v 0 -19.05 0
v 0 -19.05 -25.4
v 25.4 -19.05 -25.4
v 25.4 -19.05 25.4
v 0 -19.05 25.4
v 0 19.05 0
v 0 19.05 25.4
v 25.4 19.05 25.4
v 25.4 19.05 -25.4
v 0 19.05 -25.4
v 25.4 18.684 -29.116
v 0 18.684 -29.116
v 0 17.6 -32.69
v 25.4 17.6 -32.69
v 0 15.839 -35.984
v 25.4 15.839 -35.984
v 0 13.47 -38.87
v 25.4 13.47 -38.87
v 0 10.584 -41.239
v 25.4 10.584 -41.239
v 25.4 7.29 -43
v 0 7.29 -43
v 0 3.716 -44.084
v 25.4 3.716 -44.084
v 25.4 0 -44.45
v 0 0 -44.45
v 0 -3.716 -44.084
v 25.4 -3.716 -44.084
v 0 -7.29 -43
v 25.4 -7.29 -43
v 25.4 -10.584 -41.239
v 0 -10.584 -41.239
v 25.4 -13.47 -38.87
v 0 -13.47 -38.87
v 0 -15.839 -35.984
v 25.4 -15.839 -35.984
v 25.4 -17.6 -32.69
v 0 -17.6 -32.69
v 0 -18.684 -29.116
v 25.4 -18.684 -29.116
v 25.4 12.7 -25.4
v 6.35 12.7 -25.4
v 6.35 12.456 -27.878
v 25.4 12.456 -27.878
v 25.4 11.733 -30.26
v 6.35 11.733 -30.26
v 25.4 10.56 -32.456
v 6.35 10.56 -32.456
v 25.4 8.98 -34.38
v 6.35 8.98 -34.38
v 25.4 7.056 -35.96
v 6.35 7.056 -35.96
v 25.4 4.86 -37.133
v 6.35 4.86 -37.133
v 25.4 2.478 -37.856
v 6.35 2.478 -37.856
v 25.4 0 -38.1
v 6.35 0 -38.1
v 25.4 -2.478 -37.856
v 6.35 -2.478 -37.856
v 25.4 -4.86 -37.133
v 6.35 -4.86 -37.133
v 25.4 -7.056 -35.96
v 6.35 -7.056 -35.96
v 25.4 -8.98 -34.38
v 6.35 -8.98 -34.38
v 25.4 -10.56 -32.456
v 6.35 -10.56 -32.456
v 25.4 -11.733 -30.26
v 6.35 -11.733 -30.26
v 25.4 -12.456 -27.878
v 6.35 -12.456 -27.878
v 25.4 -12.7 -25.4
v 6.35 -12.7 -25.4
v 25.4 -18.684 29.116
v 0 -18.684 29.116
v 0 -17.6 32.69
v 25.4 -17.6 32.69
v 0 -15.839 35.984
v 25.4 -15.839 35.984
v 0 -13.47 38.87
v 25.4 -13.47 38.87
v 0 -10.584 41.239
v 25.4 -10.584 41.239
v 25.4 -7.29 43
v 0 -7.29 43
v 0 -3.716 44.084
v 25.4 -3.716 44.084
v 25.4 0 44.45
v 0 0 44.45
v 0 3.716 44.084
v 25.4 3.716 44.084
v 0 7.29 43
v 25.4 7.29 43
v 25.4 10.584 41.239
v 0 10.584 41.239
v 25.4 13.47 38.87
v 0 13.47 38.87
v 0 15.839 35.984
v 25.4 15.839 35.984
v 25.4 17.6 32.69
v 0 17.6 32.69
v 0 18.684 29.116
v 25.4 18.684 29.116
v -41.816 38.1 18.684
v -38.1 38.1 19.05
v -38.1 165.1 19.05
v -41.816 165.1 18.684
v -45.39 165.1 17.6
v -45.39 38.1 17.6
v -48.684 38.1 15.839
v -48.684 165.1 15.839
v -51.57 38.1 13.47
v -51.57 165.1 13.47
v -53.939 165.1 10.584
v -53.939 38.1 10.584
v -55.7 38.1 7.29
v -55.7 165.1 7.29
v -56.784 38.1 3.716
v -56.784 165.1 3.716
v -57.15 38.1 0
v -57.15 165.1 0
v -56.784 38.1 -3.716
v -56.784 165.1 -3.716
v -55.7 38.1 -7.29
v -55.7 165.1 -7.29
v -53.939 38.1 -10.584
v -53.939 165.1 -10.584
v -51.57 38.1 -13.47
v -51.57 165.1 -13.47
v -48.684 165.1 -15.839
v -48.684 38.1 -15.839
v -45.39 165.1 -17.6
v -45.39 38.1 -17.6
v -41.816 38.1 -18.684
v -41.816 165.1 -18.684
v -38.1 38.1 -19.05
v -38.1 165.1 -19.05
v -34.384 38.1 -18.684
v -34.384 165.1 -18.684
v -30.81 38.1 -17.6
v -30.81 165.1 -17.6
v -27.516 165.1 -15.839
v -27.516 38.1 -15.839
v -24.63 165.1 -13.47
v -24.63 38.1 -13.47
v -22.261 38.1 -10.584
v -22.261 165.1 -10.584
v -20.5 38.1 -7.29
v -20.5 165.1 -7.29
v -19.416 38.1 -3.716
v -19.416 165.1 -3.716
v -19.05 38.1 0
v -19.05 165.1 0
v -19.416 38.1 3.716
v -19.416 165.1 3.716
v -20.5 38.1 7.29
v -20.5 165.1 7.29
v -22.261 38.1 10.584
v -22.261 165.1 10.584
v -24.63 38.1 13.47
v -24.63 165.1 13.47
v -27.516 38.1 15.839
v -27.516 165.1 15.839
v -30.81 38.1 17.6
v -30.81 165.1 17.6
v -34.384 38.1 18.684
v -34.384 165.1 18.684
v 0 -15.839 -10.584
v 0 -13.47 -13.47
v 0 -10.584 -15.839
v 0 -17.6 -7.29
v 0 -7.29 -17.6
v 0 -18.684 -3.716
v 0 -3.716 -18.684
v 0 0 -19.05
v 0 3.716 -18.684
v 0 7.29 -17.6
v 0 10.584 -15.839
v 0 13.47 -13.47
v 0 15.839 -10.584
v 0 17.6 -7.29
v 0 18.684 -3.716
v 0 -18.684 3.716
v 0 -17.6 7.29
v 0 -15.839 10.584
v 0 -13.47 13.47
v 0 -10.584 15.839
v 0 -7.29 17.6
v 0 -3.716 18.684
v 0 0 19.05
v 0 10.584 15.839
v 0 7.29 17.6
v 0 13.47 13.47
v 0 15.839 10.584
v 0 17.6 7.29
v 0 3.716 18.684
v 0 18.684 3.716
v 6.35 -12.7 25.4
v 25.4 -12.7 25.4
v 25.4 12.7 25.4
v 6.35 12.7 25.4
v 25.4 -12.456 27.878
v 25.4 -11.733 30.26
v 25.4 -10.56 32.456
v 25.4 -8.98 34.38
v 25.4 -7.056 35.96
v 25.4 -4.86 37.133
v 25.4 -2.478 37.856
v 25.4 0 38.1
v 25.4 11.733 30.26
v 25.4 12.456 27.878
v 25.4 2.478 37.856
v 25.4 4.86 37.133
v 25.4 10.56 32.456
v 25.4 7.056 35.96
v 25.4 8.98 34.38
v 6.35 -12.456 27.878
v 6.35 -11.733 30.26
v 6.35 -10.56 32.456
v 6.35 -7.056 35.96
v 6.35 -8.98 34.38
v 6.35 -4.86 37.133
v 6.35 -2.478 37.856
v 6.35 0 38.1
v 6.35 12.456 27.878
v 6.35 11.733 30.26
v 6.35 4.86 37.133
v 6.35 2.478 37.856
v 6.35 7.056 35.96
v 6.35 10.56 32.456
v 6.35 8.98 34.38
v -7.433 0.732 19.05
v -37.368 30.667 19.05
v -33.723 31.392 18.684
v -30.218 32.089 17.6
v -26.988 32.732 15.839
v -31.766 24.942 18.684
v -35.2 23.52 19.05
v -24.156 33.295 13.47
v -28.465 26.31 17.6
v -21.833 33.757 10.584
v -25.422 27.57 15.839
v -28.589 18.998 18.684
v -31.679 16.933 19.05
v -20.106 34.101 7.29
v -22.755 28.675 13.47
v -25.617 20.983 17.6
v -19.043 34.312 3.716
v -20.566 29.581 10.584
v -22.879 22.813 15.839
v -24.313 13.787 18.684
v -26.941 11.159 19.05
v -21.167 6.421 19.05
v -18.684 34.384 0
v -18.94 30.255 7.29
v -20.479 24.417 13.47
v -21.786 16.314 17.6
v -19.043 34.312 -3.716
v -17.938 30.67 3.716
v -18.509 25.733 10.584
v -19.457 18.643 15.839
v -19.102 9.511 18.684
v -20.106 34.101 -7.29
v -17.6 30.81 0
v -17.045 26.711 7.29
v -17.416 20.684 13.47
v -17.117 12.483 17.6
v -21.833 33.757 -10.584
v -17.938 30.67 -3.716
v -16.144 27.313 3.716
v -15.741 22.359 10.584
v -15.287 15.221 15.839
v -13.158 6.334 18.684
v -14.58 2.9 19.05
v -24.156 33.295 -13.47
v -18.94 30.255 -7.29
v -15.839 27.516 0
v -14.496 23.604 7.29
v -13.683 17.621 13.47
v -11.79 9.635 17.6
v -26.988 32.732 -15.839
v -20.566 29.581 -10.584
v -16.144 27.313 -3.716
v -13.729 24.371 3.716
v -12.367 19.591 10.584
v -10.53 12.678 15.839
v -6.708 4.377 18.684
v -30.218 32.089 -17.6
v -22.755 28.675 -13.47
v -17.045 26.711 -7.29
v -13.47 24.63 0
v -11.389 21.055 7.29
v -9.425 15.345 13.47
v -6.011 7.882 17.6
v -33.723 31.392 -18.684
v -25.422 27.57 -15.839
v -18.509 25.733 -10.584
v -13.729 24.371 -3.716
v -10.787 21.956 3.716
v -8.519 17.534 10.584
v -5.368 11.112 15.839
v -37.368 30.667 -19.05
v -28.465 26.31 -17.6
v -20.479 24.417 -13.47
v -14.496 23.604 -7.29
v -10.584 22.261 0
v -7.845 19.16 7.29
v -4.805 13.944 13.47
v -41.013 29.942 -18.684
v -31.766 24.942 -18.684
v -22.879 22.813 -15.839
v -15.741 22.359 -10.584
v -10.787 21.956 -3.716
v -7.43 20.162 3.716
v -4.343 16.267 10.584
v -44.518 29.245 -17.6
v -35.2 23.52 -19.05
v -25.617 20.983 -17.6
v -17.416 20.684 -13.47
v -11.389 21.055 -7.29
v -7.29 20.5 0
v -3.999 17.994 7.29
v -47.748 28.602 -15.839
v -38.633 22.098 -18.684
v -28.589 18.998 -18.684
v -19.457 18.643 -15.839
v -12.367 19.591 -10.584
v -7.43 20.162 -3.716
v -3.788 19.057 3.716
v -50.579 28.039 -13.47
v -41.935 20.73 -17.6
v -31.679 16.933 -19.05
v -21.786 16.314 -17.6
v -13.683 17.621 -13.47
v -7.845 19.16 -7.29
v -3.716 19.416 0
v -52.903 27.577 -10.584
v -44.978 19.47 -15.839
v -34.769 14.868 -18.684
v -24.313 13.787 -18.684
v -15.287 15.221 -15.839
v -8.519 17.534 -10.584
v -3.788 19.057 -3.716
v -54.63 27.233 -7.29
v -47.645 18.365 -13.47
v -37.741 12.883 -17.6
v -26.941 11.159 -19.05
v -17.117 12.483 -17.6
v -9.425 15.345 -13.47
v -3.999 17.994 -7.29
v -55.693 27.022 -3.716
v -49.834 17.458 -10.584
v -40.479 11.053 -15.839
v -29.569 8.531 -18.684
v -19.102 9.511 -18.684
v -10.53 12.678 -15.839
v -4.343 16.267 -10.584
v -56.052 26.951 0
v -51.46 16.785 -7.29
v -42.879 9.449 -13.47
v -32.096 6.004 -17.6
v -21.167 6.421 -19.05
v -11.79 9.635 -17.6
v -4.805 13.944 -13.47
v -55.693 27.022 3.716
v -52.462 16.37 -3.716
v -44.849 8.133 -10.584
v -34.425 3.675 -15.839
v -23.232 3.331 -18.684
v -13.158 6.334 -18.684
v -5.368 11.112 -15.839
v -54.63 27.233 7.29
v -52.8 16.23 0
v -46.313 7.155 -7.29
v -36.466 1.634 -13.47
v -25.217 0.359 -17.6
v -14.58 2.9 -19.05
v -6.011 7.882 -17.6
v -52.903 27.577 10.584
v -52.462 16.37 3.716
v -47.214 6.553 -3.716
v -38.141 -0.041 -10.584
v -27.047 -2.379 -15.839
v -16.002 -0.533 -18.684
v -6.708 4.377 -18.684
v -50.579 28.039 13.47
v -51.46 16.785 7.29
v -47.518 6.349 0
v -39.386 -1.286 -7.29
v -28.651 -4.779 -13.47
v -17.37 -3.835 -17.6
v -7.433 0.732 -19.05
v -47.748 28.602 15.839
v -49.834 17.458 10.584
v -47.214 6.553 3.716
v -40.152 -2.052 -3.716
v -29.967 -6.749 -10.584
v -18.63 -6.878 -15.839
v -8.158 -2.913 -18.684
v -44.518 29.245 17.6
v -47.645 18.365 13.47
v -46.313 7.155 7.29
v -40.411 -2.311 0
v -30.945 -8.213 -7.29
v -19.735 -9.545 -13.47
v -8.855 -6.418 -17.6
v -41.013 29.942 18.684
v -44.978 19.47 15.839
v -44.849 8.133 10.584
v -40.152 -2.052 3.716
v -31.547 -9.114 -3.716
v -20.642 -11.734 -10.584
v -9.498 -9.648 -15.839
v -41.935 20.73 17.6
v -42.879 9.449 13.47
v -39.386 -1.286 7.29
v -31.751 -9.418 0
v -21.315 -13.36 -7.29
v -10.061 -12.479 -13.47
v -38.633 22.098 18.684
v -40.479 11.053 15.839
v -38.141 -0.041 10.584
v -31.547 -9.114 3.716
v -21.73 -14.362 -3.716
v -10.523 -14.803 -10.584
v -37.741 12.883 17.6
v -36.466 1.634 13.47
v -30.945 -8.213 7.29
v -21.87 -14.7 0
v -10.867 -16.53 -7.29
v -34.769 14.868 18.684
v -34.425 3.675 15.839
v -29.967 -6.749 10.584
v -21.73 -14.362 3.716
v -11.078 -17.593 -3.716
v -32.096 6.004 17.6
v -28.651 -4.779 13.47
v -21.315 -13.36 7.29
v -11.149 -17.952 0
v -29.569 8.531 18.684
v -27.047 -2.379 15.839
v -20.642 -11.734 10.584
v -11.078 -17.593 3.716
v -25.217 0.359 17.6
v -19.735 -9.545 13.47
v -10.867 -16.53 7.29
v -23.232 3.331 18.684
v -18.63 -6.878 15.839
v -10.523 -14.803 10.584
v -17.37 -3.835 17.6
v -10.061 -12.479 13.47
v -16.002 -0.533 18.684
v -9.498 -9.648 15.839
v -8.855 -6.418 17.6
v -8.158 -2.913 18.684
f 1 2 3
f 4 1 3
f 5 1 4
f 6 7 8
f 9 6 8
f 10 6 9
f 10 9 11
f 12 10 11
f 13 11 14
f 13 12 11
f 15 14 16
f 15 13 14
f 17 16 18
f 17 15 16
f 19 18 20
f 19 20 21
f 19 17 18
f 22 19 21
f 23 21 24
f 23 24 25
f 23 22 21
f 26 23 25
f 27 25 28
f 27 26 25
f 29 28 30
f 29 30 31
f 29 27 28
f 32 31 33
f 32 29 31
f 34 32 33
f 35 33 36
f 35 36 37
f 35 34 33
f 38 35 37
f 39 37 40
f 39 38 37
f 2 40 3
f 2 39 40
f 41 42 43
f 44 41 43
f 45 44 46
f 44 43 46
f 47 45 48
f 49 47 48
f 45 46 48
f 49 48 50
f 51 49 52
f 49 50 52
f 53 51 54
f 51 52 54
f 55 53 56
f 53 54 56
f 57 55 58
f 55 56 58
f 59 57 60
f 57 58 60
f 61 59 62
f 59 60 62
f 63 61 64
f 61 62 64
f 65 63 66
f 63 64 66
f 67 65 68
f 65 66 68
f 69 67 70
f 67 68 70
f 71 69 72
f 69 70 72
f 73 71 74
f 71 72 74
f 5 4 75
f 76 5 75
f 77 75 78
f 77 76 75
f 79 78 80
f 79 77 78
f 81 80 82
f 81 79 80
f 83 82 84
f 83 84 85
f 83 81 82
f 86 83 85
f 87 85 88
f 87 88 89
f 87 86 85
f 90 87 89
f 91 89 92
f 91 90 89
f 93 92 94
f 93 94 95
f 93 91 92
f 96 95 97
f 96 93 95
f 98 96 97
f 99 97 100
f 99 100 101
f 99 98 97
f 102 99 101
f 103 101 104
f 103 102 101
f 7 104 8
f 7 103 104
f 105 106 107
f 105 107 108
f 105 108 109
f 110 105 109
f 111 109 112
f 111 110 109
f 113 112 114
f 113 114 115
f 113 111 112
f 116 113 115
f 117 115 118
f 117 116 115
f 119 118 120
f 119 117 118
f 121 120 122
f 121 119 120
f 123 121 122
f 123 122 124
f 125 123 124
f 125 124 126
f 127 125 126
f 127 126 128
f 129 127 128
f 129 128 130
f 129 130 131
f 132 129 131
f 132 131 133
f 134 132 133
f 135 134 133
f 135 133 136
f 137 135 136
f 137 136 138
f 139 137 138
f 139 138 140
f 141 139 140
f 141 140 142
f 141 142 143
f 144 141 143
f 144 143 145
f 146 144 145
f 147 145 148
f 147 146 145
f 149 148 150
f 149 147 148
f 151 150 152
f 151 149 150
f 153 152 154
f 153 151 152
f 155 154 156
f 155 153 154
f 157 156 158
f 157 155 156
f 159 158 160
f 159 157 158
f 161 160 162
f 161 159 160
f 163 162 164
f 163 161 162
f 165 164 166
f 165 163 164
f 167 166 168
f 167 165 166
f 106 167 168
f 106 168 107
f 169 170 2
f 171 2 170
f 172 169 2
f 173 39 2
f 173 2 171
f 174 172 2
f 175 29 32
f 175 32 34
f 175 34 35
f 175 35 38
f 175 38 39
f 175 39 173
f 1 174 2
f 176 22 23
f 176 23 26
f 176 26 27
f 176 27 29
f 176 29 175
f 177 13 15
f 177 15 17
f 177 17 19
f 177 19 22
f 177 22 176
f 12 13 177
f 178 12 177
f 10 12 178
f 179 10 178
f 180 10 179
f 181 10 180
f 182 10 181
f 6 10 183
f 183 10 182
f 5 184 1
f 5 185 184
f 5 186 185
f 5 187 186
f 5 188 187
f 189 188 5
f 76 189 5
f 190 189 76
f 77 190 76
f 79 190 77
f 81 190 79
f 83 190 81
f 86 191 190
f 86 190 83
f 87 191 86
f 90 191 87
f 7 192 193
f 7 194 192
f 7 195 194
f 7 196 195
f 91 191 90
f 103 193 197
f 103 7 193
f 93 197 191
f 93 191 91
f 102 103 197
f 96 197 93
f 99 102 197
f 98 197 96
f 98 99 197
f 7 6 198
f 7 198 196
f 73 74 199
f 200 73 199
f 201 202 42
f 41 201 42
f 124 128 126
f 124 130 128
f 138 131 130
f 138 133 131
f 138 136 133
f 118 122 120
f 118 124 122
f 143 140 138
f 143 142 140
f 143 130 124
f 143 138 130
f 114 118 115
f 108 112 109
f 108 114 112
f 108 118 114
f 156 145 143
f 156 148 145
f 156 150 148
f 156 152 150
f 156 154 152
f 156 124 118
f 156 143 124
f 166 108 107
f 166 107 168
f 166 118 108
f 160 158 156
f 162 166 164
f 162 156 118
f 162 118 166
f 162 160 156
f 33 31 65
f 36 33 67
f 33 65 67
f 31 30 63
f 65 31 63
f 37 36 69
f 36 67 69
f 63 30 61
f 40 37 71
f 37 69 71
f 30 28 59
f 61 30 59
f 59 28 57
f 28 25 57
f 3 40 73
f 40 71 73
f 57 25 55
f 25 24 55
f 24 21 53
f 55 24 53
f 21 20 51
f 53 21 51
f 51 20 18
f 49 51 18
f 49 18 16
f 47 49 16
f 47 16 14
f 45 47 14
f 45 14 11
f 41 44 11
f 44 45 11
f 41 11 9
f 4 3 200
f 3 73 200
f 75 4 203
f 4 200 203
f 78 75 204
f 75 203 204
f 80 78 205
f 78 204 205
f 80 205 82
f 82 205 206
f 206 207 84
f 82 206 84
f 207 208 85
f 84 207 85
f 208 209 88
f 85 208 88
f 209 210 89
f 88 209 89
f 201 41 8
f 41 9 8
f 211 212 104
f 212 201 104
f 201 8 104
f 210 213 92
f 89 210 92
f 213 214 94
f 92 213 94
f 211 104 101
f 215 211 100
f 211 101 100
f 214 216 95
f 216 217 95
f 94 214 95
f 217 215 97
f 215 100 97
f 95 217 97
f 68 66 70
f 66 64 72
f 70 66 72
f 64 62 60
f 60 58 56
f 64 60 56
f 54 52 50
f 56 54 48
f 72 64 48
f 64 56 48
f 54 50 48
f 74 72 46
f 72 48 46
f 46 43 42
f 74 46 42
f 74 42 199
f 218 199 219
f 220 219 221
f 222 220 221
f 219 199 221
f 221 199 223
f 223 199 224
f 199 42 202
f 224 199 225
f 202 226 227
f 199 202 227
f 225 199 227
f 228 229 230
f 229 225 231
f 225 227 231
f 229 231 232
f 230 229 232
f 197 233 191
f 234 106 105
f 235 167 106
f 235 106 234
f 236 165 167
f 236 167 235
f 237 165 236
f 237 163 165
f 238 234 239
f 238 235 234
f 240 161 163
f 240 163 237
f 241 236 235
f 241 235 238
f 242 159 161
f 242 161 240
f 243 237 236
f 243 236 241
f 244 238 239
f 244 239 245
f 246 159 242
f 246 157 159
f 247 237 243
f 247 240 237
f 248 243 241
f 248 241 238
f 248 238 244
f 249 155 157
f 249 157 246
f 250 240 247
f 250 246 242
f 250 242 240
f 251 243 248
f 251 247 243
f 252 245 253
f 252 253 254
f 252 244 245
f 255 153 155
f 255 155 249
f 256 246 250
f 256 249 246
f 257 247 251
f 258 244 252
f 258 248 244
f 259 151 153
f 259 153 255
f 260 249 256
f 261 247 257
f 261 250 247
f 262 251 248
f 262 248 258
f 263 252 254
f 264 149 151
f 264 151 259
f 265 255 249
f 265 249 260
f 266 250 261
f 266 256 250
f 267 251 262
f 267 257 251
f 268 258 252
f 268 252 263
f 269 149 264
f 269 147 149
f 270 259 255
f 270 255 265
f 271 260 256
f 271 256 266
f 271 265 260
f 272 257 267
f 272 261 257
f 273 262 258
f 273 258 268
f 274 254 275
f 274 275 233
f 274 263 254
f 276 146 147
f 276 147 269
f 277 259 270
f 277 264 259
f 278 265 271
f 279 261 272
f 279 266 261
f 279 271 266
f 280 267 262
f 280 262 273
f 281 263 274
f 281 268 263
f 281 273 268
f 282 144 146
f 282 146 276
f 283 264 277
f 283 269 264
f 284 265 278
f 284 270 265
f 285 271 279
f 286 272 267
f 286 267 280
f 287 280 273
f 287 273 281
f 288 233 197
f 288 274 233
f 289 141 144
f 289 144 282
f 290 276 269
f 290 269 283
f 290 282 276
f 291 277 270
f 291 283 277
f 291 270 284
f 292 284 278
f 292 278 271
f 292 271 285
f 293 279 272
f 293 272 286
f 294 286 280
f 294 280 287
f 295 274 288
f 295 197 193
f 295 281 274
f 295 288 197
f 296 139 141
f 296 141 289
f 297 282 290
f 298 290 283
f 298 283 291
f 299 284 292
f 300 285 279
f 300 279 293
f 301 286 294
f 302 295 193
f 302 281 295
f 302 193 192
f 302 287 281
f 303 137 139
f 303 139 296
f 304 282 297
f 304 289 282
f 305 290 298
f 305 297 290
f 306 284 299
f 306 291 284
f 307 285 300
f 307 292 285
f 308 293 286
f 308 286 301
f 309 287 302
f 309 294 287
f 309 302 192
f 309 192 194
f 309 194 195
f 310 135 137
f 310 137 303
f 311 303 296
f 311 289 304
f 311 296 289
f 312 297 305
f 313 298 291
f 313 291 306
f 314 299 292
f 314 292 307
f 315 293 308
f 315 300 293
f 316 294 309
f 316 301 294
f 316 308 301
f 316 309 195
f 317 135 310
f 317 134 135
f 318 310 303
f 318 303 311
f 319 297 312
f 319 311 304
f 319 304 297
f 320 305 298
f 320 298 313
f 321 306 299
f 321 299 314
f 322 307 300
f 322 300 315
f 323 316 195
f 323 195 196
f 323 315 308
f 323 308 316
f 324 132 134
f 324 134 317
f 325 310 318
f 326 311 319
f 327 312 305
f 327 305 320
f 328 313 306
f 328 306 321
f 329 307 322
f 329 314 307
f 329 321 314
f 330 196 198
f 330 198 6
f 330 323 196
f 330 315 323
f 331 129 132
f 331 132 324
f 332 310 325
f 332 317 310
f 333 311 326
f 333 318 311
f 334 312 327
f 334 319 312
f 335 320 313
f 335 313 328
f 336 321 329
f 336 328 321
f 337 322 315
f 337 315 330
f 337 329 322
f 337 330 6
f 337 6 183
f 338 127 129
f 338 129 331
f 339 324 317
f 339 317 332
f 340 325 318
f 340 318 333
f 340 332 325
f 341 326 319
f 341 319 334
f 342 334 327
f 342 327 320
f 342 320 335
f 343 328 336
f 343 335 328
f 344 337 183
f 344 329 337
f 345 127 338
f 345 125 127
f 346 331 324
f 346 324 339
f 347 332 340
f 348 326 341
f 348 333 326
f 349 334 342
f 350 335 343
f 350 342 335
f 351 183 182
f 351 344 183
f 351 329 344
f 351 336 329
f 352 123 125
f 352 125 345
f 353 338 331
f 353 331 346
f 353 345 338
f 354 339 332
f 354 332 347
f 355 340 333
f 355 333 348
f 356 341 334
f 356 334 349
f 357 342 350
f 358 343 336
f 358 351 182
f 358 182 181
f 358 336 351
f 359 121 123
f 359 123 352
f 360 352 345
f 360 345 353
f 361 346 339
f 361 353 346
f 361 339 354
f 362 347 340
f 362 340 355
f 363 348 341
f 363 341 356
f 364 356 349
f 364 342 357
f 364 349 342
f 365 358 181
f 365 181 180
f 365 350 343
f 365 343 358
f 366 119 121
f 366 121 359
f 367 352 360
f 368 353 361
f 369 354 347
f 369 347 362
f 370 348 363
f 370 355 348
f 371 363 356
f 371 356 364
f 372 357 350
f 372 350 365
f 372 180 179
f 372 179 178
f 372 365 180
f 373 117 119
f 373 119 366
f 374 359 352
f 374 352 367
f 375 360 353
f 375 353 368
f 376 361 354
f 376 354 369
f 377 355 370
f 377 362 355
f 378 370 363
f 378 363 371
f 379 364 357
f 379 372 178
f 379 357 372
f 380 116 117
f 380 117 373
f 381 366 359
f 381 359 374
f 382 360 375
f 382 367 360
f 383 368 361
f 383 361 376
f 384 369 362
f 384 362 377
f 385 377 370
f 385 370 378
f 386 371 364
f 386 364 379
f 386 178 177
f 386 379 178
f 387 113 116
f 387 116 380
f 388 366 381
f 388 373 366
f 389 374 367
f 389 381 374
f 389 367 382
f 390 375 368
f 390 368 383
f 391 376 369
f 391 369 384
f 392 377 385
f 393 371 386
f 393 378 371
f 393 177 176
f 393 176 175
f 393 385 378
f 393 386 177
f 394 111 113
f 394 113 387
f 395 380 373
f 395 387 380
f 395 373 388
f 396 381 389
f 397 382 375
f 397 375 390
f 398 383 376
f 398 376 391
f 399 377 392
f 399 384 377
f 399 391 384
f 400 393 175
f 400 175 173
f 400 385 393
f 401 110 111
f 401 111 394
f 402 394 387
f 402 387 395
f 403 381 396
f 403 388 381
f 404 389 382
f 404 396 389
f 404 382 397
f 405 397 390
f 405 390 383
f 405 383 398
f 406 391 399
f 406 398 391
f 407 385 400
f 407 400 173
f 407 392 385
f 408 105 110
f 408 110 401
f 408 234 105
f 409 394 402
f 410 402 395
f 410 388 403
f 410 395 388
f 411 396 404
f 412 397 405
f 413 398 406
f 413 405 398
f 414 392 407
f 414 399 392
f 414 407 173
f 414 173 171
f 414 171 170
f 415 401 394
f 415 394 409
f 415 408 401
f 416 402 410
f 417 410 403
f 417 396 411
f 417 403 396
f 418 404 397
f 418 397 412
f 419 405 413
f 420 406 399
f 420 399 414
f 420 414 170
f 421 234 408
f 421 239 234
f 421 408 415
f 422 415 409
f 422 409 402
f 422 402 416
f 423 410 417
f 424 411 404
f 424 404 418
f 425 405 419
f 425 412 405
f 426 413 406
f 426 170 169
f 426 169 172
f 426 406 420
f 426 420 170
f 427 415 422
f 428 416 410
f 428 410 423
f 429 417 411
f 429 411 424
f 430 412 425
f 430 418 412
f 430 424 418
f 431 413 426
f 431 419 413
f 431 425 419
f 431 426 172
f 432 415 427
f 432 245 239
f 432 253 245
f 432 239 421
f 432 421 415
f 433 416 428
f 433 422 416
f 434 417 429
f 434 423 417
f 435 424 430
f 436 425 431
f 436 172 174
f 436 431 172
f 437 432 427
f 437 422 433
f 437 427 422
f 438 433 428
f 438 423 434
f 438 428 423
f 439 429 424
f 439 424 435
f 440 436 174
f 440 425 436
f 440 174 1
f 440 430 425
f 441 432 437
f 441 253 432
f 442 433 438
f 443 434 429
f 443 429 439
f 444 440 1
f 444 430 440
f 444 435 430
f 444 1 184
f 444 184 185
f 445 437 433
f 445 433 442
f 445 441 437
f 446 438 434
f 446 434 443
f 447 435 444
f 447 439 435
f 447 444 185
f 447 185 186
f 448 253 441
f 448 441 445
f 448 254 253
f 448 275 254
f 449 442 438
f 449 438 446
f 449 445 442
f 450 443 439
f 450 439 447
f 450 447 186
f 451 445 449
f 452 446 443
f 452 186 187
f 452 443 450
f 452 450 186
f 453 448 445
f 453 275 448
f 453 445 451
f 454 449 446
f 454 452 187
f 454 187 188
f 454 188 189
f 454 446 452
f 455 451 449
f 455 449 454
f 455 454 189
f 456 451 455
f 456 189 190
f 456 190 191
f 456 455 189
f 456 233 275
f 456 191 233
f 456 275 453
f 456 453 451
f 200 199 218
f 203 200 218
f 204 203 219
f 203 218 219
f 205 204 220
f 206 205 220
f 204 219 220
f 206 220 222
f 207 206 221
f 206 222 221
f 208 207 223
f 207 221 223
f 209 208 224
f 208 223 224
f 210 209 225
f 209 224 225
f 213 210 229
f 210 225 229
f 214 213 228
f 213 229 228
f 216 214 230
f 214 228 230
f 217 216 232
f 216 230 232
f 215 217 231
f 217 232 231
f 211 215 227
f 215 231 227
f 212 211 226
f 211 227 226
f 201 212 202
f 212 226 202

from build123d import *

# Parameters (mm, degrees)
BOSS_EXTRUDE1_DEPTH = 25.4
SHELL1_T            = -6.35
SKETCH7_R           = 19.05


with BuildPart() as part:
    # Sketch1 → Boss-Extrude1 (new body)
    with BuildSketch(Plane(origin=(0, 0, 0), x_dir=(0, 0, -1), z_dir=(1, 0, 0))):
        with BuildLine():
            Line((-25.4, 19.05), (25.4, 19.05))
            ThreePointArc((25.4, 19.05), (44.45, 0), (25.4, -19.05))
            Line((25.4, -19.05), (-25.4, -19.05))
            ThreePointArc((-25.4, -19.05), (-44.45, 0), (-25.4, 19.05))
        make_face()
    extrude(amount=BOSS_EXTRUDE1_DEPTH)

    # Shell1
    shell1_openings = [part.faces().sort_by_distance(p)[0] for p in [
        (25.4, 0, 0),
    ]]
    offset(amount=SHELL1_T, openings=shell1_openings, kind=Kind.INTERSECTION)

    # Sweep1: sweep along a path in Sketch3
    with BuildLine(Plane.XY) as sweep1_path:
        Line((-38.1, 165.1), (-38.1, 38.1))
        ThreePointArc((-38.1, 38.1), (-26.940768363, 11.159231637), (0, 0))
    # Sketch7 → Sweep1 (sweep)
    with BuildSketch(Plane.ZY):
        Circle(SKETCH7_R)
    sweep(path=sweep1_path.line)


solid = part.part
